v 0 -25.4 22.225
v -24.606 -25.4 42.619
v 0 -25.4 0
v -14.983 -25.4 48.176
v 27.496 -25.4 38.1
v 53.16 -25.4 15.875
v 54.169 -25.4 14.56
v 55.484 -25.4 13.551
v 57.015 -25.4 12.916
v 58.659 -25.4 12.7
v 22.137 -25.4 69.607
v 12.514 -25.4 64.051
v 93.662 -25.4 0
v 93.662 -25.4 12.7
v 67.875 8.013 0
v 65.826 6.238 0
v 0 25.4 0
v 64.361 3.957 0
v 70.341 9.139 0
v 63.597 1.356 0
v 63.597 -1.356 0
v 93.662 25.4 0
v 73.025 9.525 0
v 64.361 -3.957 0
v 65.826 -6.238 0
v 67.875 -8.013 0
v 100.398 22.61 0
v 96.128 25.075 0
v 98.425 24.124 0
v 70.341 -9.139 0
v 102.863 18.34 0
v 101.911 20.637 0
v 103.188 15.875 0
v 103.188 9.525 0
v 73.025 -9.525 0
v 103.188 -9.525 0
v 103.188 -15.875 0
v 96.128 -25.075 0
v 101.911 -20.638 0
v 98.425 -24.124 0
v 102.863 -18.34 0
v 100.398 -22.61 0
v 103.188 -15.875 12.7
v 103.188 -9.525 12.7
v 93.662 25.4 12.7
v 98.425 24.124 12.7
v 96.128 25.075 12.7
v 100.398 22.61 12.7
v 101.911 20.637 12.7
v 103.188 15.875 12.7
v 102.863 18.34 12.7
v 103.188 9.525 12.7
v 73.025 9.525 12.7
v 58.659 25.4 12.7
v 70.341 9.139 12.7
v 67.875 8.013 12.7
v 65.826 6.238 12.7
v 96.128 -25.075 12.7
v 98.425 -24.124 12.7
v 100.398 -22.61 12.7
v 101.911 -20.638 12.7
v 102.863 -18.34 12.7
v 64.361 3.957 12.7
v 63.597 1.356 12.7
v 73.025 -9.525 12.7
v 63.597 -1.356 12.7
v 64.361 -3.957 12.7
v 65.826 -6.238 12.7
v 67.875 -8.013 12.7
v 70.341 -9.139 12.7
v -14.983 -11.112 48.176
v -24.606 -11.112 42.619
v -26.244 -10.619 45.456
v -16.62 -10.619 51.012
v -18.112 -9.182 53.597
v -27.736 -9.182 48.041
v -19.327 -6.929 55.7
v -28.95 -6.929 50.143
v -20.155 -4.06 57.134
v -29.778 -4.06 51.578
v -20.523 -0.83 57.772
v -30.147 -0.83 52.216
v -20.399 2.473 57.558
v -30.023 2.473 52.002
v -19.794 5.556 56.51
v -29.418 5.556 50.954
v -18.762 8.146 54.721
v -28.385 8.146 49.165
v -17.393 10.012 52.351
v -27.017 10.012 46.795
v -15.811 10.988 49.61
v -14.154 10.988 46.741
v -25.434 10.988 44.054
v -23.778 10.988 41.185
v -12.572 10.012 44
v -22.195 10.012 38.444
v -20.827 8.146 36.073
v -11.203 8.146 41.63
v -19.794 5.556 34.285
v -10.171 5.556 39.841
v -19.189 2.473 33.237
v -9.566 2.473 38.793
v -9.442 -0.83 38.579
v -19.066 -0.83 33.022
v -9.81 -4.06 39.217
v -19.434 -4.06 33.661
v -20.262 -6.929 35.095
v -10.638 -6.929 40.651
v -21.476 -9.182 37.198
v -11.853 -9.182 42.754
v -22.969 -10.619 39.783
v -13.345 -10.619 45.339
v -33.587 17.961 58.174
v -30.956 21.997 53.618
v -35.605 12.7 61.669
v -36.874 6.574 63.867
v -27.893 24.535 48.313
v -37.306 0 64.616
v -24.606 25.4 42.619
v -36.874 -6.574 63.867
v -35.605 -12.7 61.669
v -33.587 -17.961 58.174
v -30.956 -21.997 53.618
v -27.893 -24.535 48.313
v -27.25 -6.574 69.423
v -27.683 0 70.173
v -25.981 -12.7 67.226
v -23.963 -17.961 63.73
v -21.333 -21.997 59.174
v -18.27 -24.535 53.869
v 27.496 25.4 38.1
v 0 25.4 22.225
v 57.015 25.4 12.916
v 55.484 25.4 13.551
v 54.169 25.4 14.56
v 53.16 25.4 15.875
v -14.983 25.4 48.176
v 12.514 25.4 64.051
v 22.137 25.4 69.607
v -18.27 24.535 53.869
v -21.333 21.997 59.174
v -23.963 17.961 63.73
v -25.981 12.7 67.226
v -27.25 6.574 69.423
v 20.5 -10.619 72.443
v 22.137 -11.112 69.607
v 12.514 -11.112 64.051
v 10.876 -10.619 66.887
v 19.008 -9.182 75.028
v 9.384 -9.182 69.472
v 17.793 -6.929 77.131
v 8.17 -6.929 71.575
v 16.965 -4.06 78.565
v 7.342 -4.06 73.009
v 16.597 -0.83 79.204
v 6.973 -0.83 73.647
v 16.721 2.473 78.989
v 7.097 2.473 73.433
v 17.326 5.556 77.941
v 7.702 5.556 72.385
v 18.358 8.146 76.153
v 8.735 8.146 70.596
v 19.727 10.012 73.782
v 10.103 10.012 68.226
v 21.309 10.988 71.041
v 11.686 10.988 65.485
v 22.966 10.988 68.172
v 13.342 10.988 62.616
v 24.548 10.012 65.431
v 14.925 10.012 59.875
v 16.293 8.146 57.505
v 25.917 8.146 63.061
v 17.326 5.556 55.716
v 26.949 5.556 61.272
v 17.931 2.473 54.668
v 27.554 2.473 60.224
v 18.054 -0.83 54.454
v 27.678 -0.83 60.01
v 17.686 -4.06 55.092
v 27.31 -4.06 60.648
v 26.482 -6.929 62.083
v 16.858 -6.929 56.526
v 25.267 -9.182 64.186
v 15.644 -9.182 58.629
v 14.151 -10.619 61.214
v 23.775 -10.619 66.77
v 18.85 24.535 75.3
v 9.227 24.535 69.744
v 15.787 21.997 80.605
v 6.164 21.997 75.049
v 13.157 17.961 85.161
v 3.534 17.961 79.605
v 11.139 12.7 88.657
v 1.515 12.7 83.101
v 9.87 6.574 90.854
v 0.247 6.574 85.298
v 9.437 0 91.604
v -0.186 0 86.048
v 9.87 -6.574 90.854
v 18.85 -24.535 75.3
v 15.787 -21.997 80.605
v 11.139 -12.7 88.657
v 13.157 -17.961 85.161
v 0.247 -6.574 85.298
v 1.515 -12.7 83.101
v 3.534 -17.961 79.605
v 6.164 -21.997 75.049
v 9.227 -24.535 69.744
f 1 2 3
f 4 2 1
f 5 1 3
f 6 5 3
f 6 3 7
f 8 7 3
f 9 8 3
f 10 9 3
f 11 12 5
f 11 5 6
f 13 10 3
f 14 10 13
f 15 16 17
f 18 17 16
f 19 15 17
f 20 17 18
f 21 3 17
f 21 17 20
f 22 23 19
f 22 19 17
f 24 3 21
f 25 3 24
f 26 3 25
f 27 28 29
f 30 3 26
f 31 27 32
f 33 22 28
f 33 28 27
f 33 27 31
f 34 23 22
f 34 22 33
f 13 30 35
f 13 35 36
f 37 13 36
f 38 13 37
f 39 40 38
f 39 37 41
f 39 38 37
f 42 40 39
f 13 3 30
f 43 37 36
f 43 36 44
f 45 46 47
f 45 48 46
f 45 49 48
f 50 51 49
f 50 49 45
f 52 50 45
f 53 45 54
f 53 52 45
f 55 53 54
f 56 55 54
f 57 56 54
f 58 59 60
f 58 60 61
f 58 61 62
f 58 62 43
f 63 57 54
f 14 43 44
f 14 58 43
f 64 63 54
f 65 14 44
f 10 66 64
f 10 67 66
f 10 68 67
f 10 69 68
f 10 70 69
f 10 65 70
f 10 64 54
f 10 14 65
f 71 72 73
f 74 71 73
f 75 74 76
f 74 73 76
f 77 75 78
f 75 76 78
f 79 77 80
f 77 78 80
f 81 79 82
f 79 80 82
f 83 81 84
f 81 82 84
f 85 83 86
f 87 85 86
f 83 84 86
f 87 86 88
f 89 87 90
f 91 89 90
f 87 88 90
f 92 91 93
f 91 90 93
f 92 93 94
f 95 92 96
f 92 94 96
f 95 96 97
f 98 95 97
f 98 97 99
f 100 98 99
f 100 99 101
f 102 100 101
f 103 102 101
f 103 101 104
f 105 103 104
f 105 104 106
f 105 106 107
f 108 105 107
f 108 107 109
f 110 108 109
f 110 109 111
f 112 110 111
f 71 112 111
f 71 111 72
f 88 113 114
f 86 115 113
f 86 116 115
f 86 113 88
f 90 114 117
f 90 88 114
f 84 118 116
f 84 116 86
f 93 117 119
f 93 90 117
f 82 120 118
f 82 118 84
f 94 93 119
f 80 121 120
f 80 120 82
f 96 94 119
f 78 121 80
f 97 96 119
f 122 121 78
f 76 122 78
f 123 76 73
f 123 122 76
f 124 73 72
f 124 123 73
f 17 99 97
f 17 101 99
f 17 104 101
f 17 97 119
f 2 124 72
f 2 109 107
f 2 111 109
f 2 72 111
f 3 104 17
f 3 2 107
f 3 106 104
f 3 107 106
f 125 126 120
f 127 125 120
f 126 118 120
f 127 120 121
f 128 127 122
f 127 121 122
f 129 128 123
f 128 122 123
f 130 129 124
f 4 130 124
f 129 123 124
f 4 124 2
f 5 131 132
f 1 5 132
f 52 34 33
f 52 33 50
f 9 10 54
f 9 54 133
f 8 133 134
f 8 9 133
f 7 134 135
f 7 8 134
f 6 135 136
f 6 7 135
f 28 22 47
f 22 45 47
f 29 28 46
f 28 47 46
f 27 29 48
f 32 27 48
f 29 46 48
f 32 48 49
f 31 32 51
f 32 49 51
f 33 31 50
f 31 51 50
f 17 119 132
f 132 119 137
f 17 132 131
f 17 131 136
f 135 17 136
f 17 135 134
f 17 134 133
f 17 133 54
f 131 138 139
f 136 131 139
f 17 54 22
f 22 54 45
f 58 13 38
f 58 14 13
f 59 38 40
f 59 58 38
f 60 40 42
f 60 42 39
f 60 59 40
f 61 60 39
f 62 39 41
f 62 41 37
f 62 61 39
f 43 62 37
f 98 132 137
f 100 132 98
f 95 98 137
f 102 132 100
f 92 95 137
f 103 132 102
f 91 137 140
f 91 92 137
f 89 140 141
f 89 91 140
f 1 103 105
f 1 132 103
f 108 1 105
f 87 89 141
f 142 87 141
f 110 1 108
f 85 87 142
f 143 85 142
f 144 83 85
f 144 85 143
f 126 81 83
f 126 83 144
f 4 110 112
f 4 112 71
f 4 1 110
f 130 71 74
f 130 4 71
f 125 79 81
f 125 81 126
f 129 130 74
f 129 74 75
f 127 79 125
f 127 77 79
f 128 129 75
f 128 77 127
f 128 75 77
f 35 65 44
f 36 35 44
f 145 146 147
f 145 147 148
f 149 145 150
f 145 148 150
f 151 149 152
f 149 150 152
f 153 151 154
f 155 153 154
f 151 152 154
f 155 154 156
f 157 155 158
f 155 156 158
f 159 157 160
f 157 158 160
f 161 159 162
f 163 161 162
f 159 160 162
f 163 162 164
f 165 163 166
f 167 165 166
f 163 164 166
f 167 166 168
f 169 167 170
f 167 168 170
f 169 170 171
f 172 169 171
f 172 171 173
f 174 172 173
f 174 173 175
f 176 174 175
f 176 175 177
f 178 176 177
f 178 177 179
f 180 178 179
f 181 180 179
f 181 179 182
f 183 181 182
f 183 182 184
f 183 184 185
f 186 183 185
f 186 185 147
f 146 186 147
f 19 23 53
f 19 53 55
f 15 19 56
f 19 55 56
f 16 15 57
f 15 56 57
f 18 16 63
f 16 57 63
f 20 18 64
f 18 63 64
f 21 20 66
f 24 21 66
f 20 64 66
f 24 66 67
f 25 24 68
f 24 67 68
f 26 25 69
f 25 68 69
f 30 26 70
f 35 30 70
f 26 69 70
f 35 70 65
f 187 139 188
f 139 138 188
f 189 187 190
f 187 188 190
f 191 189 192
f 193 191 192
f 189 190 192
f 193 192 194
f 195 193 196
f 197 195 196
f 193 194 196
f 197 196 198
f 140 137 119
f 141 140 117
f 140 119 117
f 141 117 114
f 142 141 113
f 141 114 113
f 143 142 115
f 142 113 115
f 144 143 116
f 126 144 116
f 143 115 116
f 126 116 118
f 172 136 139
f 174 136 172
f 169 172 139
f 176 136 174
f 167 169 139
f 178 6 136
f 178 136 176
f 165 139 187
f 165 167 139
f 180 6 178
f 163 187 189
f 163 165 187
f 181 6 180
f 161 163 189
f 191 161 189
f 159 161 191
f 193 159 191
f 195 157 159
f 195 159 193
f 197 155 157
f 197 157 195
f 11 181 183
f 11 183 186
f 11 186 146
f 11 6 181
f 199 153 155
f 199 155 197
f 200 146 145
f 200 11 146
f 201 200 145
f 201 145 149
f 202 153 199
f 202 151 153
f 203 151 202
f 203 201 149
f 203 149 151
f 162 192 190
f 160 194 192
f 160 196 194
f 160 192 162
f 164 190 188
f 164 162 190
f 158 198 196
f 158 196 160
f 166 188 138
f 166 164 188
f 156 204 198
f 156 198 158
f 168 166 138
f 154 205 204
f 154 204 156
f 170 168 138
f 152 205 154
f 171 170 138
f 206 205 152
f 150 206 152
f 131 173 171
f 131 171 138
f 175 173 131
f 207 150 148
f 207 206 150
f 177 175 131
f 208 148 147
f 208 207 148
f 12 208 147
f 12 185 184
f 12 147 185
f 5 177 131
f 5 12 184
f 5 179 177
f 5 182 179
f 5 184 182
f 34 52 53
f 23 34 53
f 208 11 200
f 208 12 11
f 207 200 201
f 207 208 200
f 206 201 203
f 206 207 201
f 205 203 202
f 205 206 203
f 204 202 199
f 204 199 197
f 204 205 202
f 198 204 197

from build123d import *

# Parameters (mm, degrees)
F1_DEPTH = 25.4
F3_DEPTH = 12.701
F5_D     = 22.225
F6_R     = 25.39999
F7_R     = 9.525


# Not quite as in the source:
# - a fillet or chamfer is up to 0.001 mm smaller than in the source, because OpenCascade refuses the exact size


with BuildPart() as f1:
    # F0 (on Front) → F1 (new body, symmetric)
    with BuildSketch(Plane.XZ):
        with BuildLine():
            Line((-37.30625, 64.6163204399), (0, 0))
            Line((0, 0), (103.1875, 0))
            Line((103.1875, 0), (103.1875, 12.7))
            Line((103.1875, 12.7), (58.6587873497, 12.7))
            ThreePointArc((58.6587873497, 12.7), (55.4837873497, 13.550738686), (53.1595260356, 15.875))
            Line((53.1595260356, 15.875), (9.4374711693, 91.6038204399))
            Line((9.4374711693, 91.6038204399), (-0.1862361303, 86.0475704399))
            Line((-0.1862361303, 86.0475704399), (27.4963065702, 38.1))
            Line((27.4963065702, 38.1), (0, 22.225))
            Line((0, 22.225), (-27.6825427004, 70.1725704399))
            Line((-27.6825427004, 70.1725704399), (-37.30625, 64.6163204399))
        make_face()
    extrude(amount=F1_DEPTH, both=True)

    # F2 (on face) → F3 (cut, through all)
    with BuildSketch(Plane.XY.offset(12.7)):
        with BuildLine():
            Line((103.1875, 9.525), (73.025, 9.525))
            ThreePointArc((73.025, 9.525), (63.5, 0), (73.025, -9.525))
            Line((73.025, -9.525), (103.1875, -9.525))
            Line((103.1875, -9.525), (103.1875, 9.525))
        make_face()
    extrude(amount=-F3_DEPTH, mode=Mode.SUBTRACT)

    # F5 (through all)
    with Locations(Plane(origin=(46.7437211693, 0, 26.9875), x_dir=(0, 1, 0), z_dir=(0.8660254038, 0, 0.5))):
        with Locations((0, 49.2125)):
            Hole(F5_D / 2)

    # F6 (radius 25.4 in the source; OpenCascade refuses exactly that, so slightly less here)
    f6_edges = [f1.edges().sort_by_distance(p)[0] for p in [
        (-32.494396, 25.4, 67.394445),
        (4.625618, 25.4, 88.825695),
        (-32.494396, -25.4, 67.394445),
        (4.625618, -25.4, 88.825695),
    ]]
    fillet(f6_edges, radius=F6_R)

    # F7
    f7_edges = [f1.edges().sort_by_distance(p)[0] for p in [
        (103.1875, 25.4, 6.35),
        (103.1875, -25.4, 6.35),
    ]]
    fillet(f7_edges, radius=F7_R)


solid = f1.part
